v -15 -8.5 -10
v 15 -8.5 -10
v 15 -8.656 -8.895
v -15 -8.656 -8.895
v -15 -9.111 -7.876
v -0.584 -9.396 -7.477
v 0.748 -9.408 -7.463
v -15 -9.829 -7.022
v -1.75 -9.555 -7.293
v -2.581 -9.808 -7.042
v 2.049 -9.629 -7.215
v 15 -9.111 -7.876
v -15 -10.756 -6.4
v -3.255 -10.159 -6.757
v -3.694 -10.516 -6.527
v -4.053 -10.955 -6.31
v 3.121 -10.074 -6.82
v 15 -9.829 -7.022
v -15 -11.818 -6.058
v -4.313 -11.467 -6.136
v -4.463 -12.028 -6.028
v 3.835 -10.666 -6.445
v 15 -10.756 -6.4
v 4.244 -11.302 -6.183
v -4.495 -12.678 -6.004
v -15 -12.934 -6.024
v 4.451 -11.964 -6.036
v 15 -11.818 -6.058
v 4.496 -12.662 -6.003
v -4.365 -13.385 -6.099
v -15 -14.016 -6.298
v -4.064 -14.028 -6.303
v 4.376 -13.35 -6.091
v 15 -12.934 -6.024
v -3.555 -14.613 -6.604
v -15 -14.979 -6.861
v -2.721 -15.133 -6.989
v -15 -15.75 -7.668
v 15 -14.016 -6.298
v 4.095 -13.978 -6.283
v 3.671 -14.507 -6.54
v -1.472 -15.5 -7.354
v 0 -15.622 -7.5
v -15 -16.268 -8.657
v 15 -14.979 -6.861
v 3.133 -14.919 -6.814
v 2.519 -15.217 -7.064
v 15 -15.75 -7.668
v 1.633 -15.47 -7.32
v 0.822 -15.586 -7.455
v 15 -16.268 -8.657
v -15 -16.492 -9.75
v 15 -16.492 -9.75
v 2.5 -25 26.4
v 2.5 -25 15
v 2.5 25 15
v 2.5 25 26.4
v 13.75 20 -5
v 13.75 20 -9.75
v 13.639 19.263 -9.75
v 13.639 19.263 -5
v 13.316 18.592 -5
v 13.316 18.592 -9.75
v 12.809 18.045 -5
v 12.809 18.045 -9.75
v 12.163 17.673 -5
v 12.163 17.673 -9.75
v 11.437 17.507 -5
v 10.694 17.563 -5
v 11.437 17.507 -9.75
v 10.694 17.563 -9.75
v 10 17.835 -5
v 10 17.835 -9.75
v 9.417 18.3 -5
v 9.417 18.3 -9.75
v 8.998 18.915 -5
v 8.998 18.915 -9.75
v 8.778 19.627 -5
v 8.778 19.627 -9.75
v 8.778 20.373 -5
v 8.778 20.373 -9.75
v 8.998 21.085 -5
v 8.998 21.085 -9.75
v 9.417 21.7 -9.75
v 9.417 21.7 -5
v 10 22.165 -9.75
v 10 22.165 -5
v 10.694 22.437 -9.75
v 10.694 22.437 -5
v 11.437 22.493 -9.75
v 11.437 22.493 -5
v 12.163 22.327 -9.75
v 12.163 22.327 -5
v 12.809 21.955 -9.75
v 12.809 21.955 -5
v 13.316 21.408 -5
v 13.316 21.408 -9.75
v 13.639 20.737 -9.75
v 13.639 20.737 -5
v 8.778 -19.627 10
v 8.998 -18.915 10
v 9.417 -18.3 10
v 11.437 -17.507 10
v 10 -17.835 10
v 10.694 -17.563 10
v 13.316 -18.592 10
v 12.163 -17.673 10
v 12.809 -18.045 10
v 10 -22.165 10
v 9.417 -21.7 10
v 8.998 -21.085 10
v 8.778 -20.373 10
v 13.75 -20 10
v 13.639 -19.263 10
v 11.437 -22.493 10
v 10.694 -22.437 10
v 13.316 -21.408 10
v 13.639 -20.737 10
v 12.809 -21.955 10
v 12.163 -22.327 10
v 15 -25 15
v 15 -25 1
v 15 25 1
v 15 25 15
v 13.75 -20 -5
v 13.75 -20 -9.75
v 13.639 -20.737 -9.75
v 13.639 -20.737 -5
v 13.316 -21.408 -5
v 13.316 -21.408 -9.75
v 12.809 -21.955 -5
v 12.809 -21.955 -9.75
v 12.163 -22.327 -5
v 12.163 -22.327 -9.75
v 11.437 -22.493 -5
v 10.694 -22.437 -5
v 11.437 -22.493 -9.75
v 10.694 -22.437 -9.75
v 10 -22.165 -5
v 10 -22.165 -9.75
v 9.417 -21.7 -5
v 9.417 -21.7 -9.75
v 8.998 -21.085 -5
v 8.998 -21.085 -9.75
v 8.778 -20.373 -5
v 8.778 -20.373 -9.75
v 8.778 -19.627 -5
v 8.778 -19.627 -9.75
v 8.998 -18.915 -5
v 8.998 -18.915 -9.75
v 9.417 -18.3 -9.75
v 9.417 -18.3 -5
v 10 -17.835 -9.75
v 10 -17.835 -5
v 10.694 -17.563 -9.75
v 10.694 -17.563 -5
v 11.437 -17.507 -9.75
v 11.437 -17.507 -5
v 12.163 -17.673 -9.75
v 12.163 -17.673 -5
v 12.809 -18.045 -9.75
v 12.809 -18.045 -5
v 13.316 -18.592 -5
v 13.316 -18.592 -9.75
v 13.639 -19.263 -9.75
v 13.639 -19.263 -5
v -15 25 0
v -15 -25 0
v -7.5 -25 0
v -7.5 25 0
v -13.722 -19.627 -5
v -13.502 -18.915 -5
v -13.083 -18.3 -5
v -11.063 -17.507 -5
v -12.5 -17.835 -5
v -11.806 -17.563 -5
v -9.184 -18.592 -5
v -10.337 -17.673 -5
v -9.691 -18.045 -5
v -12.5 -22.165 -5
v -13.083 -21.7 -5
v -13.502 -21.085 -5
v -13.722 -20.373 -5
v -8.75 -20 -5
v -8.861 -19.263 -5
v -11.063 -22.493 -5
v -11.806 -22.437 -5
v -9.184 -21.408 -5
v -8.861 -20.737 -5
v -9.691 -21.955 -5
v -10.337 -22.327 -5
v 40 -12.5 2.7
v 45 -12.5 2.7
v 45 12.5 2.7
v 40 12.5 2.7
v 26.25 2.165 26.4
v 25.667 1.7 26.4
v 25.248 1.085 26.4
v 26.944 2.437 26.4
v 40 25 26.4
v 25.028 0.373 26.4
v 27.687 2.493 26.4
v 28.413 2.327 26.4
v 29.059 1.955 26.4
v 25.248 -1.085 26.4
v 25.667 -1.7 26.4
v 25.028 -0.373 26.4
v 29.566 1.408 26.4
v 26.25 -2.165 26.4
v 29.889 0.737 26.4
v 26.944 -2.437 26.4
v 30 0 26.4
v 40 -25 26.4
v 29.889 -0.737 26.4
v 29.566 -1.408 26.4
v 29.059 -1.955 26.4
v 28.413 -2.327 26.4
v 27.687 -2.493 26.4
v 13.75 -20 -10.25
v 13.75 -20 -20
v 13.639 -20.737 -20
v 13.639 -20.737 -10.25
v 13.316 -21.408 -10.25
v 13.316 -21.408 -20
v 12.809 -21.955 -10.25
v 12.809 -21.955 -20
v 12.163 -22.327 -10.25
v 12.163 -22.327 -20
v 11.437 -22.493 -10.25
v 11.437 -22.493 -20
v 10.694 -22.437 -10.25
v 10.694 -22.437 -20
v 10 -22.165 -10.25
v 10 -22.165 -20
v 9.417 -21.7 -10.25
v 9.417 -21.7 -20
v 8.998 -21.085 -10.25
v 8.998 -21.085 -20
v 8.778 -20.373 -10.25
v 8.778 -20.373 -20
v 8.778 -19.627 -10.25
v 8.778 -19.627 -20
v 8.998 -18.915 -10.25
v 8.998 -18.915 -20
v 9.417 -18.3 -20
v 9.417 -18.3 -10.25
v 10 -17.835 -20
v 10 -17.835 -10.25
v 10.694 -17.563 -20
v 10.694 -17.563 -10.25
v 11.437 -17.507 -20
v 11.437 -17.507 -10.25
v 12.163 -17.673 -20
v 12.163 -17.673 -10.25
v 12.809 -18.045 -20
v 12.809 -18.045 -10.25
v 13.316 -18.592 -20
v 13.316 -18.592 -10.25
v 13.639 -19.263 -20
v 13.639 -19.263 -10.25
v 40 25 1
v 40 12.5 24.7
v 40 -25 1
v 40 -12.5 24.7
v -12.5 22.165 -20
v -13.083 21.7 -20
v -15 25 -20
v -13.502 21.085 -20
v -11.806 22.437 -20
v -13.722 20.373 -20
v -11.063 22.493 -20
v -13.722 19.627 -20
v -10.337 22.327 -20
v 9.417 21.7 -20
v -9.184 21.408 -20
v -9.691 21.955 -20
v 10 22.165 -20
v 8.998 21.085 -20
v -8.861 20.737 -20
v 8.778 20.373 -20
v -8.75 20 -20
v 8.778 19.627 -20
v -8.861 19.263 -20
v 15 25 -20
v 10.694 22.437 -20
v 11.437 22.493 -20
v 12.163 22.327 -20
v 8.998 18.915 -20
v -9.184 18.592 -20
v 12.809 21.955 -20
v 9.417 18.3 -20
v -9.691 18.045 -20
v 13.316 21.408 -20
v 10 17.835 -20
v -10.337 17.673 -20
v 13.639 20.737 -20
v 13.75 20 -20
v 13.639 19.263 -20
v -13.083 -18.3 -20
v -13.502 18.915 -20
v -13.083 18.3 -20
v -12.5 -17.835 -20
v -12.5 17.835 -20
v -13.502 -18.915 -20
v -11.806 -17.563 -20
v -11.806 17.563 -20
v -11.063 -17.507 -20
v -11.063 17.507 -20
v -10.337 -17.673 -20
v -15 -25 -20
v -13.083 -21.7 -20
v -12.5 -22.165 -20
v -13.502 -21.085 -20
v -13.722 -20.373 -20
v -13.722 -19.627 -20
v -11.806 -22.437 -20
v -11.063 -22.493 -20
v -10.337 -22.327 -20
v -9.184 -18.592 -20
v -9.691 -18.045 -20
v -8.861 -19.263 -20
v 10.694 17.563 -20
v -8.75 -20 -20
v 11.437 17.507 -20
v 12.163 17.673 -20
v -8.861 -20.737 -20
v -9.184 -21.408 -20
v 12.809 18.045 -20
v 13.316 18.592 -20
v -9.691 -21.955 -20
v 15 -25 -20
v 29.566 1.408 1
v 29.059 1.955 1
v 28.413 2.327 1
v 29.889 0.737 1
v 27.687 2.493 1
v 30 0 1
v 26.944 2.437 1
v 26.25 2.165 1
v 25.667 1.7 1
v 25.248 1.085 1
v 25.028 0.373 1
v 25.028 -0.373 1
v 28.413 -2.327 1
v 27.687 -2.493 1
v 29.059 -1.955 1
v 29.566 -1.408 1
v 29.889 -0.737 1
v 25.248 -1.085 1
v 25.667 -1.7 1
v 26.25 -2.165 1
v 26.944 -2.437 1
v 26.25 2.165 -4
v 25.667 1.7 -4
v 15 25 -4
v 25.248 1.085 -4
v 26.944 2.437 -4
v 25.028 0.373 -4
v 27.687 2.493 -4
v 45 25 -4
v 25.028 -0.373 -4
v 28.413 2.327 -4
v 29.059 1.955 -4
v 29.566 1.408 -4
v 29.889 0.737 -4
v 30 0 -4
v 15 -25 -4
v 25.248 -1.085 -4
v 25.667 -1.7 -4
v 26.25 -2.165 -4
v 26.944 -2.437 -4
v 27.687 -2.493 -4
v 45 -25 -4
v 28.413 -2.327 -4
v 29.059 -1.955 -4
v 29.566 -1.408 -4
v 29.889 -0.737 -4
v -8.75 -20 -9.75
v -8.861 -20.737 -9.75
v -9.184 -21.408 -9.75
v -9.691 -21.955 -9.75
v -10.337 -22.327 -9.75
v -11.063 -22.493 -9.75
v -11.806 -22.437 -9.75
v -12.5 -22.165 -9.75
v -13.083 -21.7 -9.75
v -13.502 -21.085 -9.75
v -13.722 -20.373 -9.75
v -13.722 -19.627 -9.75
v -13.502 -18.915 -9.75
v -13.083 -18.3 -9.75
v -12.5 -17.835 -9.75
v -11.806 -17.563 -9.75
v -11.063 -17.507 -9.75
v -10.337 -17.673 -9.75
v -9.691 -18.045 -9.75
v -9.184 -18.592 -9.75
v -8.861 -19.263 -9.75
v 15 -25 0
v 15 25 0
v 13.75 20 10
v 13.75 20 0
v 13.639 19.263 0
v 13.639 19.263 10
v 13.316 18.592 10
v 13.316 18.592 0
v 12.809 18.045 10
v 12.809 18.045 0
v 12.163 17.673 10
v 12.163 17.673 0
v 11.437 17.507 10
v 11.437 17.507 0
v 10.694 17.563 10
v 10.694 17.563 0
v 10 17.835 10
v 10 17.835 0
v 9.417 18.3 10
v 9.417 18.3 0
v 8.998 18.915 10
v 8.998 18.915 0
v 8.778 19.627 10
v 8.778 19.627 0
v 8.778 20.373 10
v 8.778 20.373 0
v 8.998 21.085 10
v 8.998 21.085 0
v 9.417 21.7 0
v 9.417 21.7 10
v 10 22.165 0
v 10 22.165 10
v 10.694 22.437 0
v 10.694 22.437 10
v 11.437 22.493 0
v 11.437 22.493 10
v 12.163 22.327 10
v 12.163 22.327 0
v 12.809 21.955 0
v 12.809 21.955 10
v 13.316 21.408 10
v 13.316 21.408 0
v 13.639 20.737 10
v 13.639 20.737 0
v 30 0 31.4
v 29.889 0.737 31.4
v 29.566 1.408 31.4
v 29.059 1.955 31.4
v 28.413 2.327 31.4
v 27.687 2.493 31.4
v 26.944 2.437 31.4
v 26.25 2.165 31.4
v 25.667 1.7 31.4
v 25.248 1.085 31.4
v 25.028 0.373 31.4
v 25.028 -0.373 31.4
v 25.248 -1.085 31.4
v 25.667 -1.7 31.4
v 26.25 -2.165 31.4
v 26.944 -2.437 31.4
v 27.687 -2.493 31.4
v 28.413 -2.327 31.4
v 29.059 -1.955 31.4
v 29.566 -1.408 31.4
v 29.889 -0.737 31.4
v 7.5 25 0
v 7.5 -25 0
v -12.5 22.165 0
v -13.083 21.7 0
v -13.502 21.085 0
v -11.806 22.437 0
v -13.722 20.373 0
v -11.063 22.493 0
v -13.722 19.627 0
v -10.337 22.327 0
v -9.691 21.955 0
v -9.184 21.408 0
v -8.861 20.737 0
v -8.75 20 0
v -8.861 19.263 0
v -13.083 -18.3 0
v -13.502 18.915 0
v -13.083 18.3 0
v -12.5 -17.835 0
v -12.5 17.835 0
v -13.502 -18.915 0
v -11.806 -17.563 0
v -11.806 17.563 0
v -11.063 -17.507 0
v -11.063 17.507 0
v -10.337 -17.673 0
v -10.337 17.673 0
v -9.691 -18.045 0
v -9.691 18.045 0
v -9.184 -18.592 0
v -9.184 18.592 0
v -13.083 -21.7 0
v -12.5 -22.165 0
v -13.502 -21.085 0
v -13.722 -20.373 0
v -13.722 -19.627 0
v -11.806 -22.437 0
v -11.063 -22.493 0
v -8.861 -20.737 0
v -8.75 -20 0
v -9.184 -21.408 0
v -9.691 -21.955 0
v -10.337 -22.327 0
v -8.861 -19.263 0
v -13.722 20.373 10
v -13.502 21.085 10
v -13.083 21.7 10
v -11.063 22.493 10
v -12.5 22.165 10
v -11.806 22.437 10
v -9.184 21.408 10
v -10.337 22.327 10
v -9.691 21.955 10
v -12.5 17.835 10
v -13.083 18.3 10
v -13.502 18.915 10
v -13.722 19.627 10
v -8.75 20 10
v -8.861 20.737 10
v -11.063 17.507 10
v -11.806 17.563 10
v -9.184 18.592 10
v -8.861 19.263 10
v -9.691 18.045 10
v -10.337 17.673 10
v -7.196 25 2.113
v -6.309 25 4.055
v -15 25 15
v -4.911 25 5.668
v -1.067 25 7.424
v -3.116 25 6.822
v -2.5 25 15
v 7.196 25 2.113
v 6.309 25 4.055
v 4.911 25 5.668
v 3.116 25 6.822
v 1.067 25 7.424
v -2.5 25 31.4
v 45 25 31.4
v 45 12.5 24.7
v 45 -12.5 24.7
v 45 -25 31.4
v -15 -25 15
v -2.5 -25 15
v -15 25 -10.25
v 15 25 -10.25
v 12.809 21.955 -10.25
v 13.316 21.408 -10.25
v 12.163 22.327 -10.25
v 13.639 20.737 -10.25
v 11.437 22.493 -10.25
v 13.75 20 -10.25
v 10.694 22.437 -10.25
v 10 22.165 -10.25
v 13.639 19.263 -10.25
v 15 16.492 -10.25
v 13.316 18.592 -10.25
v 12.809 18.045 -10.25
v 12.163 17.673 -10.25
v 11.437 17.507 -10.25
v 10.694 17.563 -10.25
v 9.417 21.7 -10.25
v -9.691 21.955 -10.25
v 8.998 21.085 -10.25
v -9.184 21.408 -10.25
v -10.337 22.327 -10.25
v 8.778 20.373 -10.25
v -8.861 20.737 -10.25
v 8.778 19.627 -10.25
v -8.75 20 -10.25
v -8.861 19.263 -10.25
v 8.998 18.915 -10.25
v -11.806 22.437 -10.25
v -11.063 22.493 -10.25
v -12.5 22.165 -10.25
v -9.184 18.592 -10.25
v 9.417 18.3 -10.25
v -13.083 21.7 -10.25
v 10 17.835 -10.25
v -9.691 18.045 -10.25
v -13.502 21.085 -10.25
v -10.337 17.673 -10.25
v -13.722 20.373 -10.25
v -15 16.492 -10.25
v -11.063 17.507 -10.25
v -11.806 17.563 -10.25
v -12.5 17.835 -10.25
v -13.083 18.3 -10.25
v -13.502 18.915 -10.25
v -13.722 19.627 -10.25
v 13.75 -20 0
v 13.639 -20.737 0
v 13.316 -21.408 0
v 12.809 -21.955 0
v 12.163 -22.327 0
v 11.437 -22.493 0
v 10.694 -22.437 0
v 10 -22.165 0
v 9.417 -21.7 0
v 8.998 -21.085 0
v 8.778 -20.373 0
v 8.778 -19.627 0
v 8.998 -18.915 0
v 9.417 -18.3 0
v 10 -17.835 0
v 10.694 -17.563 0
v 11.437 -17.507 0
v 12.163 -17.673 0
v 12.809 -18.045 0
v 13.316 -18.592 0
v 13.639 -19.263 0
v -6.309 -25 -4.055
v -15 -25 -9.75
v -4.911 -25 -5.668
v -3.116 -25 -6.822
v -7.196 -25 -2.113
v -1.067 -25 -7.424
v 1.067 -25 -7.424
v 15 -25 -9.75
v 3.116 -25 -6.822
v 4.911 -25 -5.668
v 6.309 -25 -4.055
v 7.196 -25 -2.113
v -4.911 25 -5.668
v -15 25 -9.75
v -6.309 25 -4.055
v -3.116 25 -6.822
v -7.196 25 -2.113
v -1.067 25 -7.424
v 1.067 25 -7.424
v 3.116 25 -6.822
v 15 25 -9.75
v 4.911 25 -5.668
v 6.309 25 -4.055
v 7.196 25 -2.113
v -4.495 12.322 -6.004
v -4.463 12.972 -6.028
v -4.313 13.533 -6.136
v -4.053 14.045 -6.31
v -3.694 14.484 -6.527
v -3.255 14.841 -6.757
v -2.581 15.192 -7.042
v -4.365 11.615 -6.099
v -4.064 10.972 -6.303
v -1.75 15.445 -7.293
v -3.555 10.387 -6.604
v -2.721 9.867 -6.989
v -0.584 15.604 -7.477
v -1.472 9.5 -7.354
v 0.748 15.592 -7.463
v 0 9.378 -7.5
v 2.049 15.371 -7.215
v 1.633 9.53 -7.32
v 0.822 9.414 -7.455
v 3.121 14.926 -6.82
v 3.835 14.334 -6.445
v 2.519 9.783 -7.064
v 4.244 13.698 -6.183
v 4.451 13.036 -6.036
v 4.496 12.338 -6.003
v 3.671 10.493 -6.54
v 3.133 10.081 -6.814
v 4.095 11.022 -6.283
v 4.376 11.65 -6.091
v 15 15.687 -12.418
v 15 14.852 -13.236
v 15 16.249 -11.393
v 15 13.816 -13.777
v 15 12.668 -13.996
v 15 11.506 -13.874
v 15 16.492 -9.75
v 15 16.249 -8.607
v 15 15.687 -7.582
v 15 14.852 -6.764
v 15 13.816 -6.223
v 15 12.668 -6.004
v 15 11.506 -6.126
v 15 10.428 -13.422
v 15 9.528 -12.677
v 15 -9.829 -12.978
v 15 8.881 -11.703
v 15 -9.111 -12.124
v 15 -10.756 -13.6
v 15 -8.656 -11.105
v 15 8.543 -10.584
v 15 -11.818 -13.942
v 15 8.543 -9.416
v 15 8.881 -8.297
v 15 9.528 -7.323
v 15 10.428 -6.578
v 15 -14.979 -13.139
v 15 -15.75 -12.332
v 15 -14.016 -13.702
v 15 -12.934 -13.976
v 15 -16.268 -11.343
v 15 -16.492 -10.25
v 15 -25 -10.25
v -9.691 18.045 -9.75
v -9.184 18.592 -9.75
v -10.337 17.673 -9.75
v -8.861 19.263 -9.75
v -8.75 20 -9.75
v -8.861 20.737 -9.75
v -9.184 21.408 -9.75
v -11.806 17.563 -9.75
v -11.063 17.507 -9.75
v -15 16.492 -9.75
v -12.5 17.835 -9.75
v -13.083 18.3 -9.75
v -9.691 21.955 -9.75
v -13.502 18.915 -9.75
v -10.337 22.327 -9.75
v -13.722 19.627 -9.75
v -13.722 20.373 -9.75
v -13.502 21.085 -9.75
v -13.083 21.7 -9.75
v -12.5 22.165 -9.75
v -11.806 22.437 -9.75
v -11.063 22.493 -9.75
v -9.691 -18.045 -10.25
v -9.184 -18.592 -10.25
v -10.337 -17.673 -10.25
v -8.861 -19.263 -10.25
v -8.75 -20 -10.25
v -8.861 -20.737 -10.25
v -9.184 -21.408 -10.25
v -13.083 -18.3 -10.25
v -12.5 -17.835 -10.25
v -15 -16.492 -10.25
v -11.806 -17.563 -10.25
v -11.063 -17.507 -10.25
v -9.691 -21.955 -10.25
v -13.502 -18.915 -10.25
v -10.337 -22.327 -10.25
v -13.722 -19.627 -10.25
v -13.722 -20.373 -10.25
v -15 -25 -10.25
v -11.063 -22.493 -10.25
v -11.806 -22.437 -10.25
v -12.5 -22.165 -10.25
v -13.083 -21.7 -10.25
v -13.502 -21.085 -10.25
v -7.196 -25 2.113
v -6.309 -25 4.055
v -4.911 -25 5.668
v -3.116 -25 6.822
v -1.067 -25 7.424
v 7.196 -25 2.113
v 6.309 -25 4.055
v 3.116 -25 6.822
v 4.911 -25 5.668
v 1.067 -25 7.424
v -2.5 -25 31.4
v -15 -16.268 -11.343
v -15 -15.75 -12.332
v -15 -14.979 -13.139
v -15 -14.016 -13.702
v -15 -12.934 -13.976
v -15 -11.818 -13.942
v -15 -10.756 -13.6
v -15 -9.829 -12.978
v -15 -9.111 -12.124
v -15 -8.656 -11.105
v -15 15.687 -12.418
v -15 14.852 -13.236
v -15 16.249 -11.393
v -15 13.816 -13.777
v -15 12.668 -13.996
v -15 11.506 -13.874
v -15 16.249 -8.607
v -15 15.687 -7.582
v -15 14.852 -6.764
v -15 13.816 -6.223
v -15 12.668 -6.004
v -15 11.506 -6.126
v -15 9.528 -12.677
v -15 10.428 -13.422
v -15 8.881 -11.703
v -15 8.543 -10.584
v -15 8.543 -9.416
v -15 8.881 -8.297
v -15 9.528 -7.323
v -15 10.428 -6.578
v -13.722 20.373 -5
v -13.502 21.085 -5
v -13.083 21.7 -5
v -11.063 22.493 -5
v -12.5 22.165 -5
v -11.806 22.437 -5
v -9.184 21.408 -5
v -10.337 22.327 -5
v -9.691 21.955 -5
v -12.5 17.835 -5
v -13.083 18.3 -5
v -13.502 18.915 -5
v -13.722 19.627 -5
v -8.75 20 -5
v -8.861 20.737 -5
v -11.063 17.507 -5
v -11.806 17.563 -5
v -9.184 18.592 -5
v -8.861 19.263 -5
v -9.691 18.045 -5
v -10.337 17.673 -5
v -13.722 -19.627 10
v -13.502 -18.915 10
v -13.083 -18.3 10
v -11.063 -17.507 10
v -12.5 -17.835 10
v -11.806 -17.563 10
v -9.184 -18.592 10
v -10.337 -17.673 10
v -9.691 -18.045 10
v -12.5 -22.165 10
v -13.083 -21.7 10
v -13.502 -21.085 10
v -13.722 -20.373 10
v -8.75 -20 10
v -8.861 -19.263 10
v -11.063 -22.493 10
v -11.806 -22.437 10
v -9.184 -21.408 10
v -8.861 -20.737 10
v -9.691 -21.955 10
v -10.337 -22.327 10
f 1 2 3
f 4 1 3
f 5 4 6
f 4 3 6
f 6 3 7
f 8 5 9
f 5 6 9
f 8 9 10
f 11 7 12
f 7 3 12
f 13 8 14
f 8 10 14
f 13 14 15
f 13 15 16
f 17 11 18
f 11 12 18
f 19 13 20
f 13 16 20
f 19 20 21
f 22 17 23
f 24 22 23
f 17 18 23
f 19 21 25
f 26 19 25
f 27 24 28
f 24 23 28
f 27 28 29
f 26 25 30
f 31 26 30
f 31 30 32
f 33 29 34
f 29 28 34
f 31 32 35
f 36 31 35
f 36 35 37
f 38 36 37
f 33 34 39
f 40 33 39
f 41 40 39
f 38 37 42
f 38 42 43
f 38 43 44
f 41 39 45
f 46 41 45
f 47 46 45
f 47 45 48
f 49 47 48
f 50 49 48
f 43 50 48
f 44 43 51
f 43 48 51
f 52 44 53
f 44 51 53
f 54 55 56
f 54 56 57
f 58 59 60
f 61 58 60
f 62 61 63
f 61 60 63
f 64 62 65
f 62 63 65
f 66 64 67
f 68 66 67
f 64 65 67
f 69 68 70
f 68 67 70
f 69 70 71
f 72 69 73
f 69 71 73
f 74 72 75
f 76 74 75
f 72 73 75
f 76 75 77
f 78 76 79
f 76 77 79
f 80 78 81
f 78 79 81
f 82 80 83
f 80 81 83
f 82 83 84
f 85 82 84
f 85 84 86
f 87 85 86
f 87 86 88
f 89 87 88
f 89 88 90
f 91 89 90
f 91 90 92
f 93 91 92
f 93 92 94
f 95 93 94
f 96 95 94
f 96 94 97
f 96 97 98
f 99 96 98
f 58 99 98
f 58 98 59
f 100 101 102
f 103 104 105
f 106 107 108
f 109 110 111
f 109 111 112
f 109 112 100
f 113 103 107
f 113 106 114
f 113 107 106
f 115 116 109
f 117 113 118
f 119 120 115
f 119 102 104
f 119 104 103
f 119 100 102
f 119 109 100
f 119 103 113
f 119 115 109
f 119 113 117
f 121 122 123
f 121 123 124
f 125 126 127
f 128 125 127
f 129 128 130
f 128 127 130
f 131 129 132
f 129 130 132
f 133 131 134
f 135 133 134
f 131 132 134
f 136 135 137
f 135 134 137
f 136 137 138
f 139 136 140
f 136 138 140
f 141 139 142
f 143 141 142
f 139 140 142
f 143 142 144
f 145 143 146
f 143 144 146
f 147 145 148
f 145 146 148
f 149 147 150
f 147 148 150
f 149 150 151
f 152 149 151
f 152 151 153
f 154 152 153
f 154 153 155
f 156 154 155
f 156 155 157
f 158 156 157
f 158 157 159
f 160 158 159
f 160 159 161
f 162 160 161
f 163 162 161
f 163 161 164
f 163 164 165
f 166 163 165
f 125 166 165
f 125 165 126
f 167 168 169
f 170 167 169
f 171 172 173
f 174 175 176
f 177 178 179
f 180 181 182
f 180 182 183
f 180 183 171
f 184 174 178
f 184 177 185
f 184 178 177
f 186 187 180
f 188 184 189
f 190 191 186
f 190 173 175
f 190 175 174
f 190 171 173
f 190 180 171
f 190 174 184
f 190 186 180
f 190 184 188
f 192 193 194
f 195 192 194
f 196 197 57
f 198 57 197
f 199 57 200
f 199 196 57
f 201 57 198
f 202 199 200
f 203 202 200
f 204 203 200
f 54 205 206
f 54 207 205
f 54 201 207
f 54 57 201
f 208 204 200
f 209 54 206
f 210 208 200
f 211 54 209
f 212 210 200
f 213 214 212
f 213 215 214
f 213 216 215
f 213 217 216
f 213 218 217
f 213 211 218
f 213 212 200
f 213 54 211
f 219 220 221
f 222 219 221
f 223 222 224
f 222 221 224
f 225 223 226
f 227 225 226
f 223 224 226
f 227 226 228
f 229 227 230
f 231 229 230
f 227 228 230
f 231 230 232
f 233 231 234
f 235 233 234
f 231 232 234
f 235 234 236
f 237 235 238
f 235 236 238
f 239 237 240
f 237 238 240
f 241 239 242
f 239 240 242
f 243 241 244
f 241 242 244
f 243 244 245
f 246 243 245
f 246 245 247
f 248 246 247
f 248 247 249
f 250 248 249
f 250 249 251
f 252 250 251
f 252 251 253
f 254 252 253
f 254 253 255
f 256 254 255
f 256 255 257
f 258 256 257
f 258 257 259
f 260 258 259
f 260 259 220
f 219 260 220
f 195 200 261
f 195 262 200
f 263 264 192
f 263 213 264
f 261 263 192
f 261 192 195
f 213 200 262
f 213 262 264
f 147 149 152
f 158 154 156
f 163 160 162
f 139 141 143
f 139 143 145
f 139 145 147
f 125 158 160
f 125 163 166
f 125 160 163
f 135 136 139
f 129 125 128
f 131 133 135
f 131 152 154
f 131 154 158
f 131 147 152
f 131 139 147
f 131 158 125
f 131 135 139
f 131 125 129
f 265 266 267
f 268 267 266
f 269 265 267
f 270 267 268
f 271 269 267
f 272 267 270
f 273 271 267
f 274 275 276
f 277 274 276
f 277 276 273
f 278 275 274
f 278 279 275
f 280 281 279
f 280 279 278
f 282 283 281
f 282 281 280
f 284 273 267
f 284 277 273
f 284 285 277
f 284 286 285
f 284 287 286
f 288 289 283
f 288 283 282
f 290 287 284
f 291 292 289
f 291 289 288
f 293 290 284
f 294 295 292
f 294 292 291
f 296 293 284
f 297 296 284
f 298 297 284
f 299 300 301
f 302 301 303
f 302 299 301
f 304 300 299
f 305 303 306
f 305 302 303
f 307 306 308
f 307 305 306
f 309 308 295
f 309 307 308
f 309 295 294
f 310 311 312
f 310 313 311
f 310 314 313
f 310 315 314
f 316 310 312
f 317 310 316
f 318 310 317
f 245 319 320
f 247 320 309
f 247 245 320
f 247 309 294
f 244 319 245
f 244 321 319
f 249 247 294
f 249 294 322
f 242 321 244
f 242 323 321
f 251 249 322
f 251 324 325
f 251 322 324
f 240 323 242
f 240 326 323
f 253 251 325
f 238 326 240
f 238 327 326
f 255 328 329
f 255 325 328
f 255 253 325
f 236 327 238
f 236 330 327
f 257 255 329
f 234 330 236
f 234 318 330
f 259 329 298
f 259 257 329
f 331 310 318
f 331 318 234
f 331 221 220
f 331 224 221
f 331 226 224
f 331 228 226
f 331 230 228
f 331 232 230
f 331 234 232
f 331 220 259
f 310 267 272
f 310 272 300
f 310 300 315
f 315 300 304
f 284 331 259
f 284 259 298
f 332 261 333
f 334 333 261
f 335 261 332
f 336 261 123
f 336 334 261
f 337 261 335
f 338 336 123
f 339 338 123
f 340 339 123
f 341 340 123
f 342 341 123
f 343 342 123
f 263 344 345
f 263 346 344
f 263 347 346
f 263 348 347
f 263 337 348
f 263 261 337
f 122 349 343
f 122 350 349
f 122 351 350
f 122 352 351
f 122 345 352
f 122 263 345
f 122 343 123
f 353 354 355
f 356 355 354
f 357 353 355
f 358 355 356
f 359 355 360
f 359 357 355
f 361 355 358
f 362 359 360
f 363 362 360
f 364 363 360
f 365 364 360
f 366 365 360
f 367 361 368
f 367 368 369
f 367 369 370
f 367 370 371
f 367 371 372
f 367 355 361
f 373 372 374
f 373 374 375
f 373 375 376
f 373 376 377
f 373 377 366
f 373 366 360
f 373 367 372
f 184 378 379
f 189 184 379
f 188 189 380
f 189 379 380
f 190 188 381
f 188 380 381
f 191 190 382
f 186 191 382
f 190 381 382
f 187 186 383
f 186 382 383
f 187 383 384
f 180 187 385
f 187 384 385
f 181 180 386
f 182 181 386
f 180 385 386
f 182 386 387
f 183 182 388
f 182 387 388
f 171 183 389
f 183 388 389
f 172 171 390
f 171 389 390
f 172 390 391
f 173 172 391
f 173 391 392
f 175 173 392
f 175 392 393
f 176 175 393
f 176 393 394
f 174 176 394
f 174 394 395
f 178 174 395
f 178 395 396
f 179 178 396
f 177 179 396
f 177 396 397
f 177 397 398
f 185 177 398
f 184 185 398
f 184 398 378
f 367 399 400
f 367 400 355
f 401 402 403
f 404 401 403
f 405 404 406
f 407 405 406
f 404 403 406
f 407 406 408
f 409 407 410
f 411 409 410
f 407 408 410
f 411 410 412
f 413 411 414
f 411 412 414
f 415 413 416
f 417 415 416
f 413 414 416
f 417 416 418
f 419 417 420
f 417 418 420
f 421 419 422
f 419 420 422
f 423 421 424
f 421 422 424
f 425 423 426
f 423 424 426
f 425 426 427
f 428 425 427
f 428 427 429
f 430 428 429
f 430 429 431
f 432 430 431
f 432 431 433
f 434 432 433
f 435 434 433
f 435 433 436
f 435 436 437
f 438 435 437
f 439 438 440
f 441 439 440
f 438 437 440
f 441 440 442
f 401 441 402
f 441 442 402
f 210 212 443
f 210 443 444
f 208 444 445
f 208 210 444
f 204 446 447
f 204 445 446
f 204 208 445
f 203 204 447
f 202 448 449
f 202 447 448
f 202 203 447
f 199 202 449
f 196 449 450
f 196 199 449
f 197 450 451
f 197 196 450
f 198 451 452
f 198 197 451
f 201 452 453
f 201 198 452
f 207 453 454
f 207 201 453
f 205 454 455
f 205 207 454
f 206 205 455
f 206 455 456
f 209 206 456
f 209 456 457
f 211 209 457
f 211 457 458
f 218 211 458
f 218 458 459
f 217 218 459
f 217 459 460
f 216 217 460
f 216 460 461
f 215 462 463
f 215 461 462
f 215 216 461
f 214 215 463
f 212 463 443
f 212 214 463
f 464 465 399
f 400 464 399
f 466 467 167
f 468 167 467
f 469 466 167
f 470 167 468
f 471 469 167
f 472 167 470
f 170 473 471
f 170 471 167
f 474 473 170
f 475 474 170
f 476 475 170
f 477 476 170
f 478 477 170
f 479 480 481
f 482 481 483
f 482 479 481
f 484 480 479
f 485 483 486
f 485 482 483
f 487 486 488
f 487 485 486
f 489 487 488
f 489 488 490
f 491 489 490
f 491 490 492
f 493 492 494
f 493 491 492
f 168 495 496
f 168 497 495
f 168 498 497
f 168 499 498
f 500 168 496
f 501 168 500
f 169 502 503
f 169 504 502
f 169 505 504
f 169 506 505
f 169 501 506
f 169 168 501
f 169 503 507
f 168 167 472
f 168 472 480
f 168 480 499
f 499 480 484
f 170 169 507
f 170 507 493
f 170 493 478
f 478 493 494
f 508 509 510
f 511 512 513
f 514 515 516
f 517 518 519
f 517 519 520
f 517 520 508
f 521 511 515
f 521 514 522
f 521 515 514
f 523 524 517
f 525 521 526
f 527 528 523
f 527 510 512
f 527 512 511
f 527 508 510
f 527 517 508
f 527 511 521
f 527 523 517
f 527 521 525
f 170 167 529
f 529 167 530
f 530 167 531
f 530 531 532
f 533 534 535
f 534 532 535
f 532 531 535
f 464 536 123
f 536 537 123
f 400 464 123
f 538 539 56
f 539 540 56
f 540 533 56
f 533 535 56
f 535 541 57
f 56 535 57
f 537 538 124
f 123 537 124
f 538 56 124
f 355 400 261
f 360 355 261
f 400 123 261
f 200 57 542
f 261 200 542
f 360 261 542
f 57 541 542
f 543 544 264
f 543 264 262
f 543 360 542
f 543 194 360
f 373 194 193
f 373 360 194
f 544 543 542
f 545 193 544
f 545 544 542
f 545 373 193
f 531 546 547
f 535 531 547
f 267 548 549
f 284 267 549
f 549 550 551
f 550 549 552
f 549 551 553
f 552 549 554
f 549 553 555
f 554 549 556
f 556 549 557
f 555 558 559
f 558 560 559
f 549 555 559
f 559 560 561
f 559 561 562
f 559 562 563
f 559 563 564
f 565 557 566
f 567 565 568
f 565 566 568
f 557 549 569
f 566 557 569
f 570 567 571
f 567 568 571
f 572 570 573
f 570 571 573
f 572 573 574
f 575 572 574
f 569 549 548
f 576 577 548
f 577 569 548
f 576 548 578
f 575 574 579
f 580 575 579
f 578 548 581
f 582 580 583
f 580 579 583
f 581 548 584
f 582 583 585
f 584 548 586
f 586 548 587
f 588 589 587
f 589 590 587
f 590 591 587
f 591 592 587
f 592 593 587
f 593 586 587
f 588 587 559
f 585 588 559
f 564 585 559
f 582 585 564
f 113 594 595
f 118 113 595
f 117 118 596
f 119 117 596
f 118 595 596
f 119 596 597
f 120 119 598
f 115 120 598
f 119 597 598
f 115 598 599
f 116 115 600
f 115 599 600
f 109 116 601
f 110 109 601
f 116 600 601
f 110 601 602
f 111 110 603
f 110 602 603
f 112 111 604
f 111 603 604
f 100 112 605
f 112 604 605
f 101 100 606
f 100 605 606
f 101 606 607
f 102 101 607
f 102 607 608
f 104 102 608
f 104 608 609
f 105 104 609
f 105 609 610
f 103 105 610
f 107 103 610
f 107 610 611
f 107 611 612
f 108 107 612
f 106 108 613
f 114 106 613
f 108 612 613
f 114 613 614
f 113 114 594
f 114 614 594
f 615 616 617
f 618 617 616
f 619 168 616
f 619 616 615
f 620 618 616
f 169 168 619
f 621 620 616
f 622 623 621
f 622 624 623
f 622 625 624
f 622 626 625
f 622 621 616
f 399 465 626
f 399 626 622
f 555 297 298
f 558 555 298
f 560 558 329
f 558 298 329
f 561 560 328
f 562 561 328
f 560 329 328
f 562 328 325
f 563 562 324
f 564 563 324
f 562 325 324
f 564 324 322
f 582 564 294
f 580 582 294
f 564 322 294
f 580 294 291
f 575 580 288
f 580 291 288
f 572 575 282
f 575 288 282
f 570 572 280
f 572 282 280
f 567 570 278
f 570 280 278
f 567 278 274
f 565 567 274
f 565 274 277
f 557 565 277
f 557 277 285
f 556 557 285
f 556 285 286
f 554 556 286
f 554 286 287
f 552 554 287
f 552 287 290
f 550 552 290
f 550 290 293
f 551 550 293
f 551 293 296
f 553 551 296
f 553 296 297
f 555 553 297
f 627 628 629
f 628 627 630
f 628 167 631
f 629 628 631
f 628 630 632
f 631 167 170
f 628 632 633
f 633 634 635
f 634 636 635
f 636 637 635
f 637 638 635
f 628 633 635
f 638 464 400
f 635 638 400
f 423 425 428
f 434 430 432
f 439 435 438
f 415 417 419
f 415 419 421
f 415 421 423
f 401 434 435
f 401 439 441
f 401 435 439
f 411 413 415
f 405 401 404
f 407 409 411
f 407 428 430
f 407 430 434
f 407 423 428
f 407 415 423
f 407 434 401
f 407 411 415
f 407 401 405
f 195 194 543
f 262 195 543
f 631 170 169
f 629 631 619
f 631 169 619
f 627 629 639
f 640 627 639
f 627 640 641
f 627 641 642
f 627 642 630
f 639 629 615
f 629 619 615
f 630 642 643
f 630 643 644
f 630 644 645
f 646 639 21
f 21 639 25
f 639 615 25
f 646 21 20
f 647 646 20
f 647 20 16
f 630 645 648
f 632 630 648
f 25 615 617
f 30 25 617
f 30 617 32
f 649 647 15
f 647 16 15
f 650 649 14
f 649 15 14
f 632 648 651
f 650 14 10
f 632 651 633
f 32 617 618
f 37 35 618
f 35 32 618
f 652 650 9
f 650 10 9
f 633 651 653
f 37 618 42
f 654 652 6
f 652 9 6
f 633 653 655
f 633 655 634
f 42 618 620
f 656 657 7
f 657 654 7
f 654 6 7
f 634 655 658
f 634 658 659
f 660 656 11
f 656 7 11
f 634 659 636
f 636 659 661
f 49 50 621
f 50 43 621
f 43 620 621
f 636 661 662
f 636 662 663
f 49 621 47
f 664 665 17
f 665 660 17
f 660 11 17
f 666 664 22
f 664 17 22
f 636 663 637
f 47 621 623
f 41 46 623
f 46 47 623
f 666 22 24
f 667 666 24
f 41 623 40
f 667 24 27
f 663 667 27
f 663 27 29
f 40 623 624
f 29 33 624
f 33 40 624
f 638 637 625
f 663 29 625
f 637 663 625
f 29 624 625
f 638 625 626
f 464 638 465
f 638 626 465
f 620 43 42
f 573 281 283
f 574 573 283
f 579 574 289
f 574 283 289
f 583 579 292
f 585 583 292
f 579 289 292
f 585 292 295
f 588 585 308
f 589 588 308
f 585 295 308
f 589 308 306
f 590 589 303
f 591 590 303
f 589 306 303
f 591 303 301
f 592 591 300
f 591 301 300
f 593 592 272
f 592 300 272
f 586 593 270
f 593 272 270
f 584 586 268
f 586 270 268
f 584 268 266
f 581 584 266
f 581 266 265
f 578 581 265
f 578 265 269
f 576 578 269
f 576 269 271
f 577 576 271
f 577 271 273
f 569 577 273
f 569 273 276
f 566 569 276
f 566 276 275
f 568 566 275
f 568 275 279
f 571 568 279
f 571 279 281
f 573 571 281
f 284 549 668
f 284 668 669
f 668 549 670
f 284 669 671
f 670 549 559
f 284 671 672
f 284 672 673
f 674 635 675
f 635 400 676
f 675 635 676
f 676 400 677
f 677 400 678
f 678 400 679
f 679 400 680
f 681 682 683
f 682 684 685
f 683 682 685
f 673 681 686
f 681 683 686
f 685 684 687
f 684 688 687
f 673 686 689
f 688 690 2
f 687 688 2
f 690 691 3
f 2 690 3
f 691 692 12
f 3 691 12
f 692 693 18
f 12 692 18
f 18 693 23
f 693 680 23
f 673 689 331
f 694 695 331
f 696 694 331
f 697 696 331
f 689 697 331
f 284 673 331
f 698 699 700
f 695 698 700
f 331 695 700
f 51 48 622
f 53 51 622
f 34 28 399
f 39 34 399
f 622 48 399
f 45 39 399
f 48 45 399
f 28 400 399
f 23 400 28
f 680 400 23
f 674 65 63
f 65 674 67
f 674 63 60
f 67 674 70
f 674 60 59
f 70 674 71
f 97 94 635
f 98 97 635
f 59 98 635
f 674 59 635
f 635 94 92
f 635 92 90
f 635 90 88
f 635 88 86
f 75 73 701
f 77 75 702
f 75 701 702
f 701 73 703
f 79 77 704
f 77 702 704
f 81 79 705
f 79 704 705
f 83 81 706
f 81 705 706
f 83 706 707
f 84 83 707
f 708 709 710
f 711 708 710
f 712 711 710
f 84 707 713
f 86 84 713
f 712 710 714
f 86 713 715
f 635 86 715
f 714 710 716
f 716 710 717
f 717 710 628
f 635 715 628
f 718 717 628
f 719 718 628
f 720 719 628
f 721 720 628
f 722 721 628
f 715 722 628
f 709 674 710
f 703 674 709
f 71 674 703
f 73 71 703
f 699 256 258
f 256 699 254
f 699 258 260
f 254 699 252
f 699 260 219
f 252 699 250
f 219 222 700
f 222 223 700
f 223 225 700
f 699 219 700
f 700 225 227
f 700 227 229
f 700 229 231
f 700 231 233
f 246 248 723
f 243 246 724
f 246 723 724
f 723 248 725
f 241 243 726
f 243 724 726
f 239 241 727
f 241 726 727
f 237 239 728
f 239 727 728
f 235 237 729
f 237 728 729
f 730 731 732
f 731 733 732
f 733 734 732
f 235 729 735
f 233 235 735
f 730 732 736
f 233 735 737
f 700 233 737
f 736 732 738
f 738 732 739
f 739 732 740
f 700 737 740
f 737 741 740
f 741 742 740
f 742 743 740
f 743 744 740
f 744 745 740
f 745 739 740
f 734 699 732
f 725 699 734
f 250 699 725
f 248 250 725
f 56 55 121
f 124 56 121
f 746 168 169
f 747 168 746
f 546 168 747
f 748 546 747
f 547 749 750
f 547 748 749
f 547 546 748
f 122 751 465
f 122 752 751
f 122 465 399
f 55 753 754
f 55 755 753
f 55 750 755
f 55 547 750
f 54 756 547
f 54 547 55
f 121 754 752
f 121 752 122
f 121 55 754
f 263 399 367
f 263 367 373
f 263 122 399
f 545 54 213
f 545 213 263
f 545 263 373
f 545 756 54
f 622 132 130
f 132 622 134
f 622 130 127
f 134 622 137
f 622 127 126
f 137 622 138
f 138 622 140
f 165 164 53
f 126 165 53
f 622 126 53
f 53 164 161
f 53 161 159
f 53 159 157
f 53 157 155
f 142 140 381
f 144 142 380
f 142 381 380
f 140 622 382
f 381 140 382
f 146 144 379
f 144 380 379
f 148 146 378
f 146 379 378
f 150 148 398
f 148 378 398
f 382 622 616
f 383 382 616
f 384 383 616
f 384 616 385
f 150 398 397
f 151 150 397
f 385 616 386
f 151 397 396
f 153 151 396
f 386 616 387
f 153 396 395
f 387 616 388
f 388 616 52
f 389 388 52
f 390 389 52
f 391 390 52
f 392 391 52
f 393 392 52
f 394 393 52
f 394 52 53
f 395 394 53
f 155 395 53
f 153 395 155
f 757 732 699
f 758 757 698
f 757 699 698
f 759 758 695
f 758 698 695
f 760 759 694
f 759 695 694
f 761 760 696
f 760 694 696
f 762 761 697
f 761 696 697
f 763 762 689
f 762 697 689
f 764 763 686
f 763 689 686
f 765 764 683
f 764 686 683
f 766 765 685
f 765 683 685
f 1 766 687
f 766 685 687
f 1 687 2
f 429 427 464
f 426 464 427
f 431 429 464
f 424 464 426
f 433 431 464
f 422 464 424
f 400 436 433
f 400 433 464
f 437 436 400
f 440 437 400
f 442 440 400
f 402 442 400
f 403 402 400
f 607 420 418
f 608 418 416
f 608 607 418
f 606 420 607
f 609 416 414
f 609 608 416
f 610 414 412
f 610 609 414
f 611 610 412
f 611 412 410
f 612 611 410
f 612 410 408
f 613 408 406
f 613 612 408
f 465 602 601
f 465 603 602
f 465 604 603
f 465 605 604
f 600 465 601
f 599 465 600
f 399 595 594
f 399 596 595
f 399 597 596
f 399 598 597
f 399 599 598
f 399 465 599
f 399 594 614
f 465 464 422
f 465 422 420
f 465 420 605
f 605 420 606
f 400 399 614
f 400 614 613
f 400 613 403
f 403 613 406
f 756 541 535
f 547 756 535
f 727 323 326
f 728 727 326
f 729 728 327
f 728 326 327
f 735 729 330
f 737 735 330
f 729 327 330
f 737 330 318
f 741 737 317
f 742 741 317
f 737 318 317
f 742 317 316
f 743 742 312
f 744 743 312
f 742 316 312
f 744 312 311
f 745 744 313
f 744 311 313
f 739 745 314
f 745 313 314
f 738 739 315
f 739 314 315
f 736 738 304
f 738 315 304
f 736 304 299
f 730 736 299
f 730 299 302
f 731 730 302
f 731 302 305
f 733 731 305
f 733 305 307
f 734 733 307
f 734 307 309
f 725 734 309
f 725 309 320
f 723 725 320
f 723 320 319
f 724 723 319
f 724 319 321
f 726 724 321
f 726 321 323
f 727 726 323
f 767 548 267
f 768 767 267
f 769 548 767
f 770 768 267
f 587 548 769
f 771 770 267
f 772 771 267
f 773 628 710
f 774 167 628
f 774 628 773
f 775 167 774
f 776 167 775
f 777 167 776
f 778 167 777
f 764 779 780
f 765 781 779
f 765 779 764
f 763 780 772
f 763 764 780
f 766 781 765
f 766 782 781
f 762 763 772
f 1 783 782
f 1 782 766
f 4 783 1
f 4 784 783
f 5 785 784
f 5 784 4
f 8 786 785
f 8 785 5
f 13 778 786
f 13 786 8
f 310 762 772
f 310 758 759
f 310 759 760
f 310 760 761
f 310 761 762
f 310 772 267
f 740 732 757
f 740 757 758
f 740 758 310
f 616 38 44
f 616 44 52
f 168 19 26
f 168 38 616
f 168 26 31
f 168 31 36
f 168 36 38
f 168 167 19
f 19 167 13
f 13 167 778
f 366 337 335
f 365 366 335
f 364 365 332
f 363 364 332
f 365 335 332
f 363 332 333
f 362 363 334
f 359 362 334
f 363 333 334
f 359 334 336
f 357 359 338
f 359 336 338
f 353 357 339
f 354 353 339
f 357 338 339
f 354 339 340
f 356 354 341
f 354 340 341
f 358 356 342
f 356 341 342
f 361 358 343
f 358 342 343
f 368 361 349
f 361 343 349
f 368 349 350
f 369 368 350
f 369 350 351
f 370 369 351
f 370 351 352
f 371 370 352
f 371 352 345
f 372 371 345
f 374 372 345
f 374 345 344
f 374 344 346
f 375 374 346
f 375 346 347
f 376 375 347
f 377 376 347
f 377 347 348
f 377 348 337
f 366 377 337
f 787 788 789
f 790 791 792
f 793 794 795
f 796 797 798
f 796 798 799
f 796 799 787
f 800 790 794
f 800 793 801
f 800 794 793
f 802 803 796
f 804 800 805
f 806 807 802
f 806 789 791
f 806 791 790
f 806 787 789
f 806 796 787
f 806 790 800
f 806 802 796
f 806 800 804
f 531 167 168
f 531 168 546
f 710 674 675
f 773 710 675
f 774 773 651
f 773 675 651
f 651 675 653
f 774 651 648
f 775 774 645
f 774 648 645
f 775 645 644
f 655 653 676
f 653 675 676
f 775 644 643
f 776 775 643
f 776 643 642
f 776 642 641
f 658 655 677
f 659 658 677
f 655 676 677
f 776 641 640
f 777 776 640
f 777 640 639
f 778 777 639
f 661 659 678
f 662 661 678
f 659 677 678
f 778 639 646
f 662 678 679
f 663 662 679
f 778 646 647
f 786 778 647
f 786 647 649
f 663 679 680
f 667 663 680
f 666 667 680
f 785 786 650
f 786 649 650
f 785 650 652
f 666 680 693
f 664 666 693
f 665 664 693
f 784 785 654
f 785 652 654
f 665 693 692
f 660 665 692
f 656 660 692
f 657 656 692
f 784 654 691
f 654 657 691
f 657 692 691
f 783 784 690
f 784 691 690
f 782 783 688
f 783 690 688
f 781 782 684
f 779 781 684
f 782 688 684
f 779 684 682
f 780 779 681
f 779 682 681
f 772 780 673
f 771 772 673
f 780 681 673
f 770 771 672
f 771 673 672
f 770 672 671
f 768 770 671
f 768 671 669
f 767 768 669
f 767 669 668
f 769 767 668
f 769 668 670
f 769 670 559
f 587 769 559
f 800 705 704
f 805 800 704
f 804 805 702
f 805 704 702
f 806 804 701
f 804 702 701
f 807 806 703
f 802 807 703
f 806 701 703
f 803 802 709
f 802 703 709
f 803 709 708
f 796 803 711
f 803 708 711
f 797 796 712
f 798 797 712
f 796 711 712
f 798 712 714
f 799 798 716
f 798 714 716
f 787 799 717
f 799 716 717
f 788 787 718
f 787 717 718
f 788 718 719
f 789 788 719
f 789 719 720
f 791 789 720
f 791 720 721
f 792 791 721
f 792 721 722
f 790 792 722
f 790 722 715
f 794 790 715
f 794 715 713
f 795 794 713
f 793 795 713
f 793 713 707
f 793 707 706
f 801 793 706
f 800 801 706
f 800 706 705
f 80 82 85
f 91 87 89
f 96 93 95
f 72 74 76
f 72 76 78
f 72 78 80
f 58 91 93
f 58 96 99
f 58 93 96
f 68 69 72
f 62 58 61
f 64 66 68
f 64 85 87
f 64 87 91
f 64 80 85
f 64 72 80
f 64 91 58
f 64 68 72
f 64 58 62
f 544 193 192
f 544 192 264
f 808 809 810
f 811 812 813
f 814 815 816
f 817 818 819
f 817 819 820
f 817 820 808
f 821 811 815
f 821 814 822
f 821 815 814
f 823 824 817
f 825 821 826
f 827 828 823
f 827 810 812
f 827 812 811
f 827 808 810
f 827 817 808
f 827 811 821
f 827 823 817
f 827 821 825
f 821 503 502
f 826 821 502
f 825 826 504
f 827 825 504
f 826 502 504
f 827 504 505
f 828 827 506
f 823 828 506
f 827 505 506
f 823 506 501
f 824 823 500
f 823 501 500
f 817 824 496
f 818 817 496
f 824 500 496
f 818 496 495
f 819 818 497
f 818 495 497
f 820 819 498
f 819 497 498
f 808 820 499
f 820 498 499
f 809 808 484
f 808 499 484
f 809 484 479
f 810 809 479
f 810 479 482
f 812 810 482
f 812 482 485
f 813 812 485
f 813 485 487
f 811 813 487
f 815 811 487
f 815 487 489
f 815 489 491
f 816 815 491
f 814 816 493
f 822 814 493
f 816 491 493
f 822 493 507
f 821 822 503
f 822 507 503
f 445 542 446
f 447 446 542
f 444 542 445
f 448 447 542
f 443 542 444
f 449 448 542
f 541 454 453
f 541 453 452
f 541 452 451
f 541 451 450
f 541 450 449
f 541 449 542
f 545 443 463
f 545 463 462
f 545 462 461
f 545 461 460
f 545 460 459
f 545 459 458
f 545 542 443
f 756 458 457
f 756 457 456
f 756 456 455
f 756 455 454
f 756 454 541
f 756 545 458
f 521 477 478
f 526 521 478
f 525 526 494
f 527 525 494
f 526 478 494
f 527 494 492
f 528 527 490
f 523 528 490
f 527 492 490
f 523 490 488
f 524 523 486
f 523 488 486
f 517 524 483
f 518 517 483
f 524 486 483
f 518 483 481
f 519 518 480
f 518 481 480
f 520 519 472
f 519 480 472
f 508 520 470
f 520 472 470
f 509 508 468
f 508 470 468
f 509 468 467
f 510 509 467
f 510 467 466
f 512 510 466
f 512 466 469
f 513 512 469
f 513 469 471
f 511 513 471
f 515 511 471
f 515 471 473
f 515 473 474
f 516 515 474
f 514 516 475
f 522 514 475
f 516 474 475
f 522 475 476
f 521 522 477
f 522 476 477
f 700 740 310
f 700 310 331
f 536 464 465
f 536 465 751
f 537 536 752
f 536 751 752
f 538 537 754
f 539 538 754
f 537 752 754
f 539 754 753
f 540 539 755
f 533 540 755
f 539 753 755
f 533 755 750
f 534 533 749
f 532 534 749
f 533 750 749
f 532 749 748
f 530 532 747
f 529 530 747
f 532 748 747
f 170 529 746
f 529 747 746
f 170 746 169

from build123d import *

# Parameters (mm, degrees)
F0_W           = 30
F0_H           = 15
F1_DEPTH       = 25
F2_R           = 7.5
F3_DEPTH       = 50.001
F4_R           = 2.5
F5_DEPTH       = 10
F6_W           = 30
F6_H           = 50
F7_DEPTH       = 20
F8_R           = 7.5
F9_DEPTH       = 50.001
F10_R          = 2.5
F11_DEPTH      = 15
F12_R          = 4
F13_DEPTH      = 30.001
F15_DEPTH      = 30.0010001
F17_DEPTH      = 25
F18_R          = 2.5
F19_DEPTH      = 21.001
F19_DEPTH_BACK = 30.401
F20_W          = 25
F20_H          = 22
F21_DEPTH      = 5


with BuildPart() as f1:
    # F0 (on Front) → F1 (new body, symmetric)
    with BuildSketch(Plane.XZ):
        with Locations((0, 7.5)):
            Rectangle(F0_W, F0_H)
    extrude(amount=F1_DEPTH, both=True)

    # F2 (on face) → F3 (cut, through all)
    with BuildSketch(Plane.XZ.offset(25)):
        Circle(F2_R)
    extrude(amount=-F3_DEPTH, mode=Mode.SUBTRACT)

    # F4 (on face) → F5 (cut)
    with BuildSketch(Plane(origin=(0, 0, 0), x_dir=(1, 0, 0), z_dir=(0, 0, -1))):
        with Locations((-11.25, 20)):
            Circle(F4_R)
        with Locations((-11.25, -20)):
            Circle(F4_R)
        with Locations((11.25, 20)):
            Circle(F4_R)
        with Locations((11.25, -20)):
            Circle(F4_R)
    extrude(amount=-F5_DEPTH, mode=Mode.SUBTRACT)

    # F16 (on Front) → F17 (join, symmetric)
    with BuildSketch(Plane.XZ):
        Polygon((15, 1), (15, -4), (45, -4), (45, 31.4), (-2.5, 31.4), (-2.5, 15), (2.5, 15), (2.5, 26.4), (40, 26.4), (40, 1), align=None)
    extrude(amount=F17_DEPTH, both=True)

    # F18 (on face) → F19 (cut, two sides)
    with BuildSketch(Plane.XY.offset(1)) as f19_sk:
        with Locations((27.5, 0)):
            Circle(F18_R)
    extrude(amount=-F19_DEPTH, mode=Mode.SUBTRACT)
    extrude(f19_sk.sketch, amount=F19_DEPTH_BACK, mode=Mode.SUBTRACT)

    # F20 (on face) → F21 (cut, through all)
    with BuildSketch(Plane.YZ.offset(45)):
        with Locations((0, 13.7)):
            Rectangle(F20_W, F20_H)
    extrude(amount=-F21_DEPTH, mode=Mode.SUBTRACT)


with BuildPart() as f7:
    # F6 (on face) → F7 (new body)
    with BuildSketch(Plane(origin=(0, 0, 0), x_dir=(1, 0, 0), z_dir=(0, 0, -1))):
        Rectangle(F6_W, F6_H)
    extrude(amount=F7_DEPTH)

    # F8 (on face) → F9 (cut, through all)
    with BuildSketch(Plane.XZ.offset(25)):
        Circle(F8_R)
    extrude(amount=-F9_DEPTH, mode=Mode.SUBTRACT)

    # F10 (on face) → F11 (cut)
    with BuildSketch(Plane(origin=(0, 0, -20), x_dir=(1, 0, 0), z_dir=(0, 0, -1))):
        with Locations((-11.25, 20)):
            Circle(F10_R)
        with Locations((11.25, 20)):
            Circle(F10_R)
        with Locations((11.25, -20)):
            Circle(F10_R)
        with Locations((-11.25, -20)):
            Circle(F10_R)
    extrude(amount=-F11_DEPTH, mode=Mode.SUBTRACT)

    # F12 (on face) → F13 (cut, through all)
    with BuildSketch(Plane.YZ.offset(15)):
        with Locations((-12.5, -10)):
            Circle(F12_R)
        with Locations((12.5, -10)):
            Circle(F12_R)
    extrude(amount=-F13_DEPTH, mode=Mode.SUBTRACT)

    # F14 (on face) → F15 (cut, through all)
    with BuildSketch(Plane(origin=(-15, 0, 0), x_dir=(0, -1, 0), z_dir=(-1, 0, 0))):
        with BuildLine():
            Line((-16.4921798557, -9.75), (-25, -9.75))
            Line((-25, -9.75), (-25, -10.25))
            Line((-25, -10.25), (-16.4921798557, -10.25))
            ThreePointArc((-16.4921798557, -10.25), (-16.5, -10), (-16.4921798557, -9.75))
        make_face()
        with BuildLine():
            Line((25, -10.25), (25, -9.75))
            Line((25, -9.75), (16.4921798557, -9.75))
            ThreePointArc((16.4921798557, -9.75), (16.5, -10), (16.4921798557, -10.25))
            Line((16.4921798557, -10.25), (25, -10.25))
        make_face()
    extrude(amount=-F15_DEPTH, mode=Mode.SUBTRACT)


solid = Compound([f1.part, f7.part])
